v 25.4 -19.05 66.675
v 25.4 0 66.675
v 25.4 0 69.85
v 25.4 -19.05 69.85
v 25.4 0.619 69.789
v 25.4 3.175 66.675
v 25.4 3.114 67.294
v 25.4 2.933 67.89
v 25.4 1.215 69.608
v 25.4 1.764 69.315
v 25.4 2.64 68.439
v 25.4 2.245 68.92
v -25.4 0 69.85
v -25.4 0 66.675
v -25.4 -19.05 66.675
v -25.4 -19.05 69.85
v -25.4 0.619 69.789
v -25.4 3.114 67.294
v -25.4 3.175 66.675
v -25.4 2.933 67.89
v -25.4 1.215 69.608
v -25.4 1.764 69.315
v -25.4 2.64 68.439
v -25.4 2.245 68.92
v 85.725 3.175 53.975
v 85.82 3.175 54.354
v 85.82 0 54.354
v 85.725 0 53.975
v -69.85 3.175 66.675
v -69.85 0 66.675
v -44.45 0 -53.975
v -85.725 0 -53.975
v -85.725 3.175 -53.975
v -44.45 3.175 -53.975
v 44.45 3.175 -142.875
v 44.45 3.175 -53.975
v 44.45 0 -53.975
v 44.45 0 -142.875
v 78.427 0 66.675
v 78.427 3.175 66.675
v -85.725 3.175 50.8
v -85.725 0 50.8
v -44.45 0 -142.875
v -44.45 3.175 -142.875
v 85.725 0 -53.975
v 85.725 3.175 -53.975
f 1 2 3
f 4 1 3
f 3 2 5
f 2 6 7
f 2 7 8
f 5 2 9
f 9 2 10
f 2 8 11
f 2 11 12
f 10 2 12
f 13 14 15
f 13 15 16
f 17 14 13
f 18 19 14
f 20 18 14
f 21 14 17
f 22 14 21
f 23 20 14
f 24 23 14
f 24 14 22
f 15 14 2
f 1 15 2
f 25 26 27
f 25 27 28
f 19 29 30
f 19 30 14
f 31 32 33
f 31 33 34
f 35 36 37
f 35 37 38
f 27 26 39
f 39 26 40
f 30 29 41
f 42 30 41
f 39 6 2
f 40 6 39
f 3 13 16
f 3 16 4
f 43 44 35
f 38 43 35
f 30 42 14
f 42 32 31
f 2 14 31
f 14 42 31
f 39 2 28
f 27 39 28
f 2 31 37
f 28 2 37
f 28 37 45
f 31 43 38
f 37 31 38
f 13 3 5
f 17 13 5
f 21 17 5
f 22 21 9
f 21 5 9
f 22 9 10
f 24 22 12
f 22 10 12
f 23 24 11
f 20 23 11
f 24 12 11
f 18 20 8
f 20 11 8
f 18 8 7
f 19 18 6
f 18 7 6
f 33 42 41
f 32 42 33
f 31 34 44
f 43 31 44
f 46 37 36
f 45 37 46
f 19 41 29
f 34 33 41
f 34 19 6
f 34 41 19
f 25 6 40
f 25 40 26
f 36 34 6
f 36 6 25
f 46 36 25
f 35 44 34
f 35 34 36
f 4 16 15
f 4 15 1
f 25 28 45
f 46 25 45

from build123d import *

# Parameters (mm, degrees)
SKETCH1_W           = 171.45
SKETCH1_H           = 107.95
BOSS_EXTRUDE1_DEPTH = 3.175
BOSS_EXTRUDE2_DEPTH = 3.175
SKETCH4_W           = 50.8
SKETCH4_H           = 3.175
BOSS_EXTRUDE3_DEPTH = 19.05
CHAMFER1_SIZE       = 12.7
CHAMFER1_SIZE_2     = 10.472688289
CHAMFER1_SIZE_3     = 17.454480482
SKETCH6_W           = 88.9
SKETCH6_H           = 88.9
BOSS_EXTRUDE4_DEPTH = 3.175
BOSS_EXTRUDE7_DEPTH = 50.8


with BuildPart() as part:
    # Sketch1 → Boss-Extrude1 (new body)
    with BuildSketch(Plane(origin=(0, 0, 0), x_dir=(1, 0, 0), z_dir=(0, 1, 0))):
        Rectangle(SKETCH1_W, SKETCH1_H)
    extrude(amount=BOSS_EXTRUDE1_DEPTH)

    # Sketch2 → Boss-Extrude2 (add)
    with BuildSketch(Plane(origin=(0, 3.175, 0), x_dir=(1, 0, 0), z_dir=(0, 1, 0))):
        Polygon((-85.725, -53.975), (-82.55, -66.675), (88.9, -66.675), (85.725, -53.975), align=None)
    extrude(amount=-BOSS_EXTRUDE2_DEPTH)

    # Chamfer1
    # the kernel refuses this chamfer: 17.454480482, 12.7, 10.472688289 mm, written as the material it takes off along each edge
    with BuildSketch(Plane(origin=(88.9, 35.835373947, 66.675), x_dir=(-0.21576900793941634, 0, -0.9764444352920651), z_dir=(0, -1, 0))) as chamfer1_piece_1:
        Polygon((CHAMFER1_SIZE * 0.999621916911, -CHAMFER1_SIZE * 0.0274958766106), (CHAMFER1_SIZE_2 * 0.215769007941, -CHAMFER1_SIZE_2 * 0.976444435298), (0, 0), align=None)
    extrude(amount=68.495747894, mode=Mode.SUBTRACT)
    with BuildSketch(Plane(origin=(-82.55, 48.316843842, 66.675), x_dir=(0.9993006642791182, 0, 0.0373922768939412), z_dir=(0, -1, 0))) as chamfer1_piece_2:
        Polygon((CHAMFER1_SIZE * 0.999300664279, -CHAMFER1_SIZE * 0.0373922768939), (-CHAMFER1_SIZE_3 * 0.278641848199, -CHAMFER1_SIZE_3 * 0.960395085581), (0, 0), align=None)
    extrude(amount=93.458687684, mode=Mode.SUBTRACT)

    # Sketch6 → Boss-Extrude4 (add)
    with BuildSketch(Plane(origin=(0, 3.175, 0), x_dir=(1, 0, 0), z_dir=(0, 1, 0))):
        with Locations((0, 98.425)):
            Rectangle(SKETCH6_W, SKETCH6_H)
    extrude(amount=-BOSS_EXTRUDE4_DEPTH)



with BuildPart() as body_2:
    # Sketch4 → Boss-Extrude3 (new body)
    with BuildSketch(Plane.XZ):
        with Locations((0, 68.2625)):
            Rectangle(SKETCH4_W, SKETCH4_H)
    extrude(amount=BOSS_EXTRUDE3_DEPTH)


with BuildPart() as part_1:
    add(part.part)

    add(body_2.part)  # Boss-Extrude7 merges body 2
    # Sketch10 → Boss-Extrude7 (add)
    with BuildSketch(Plane(origin=(25.4, 0, 0), x_dir=(0, 0, -1), z_dir=(1, 0, 0))):
        with BuildLine():
            Line((-66.675, 3.175), (-66.675, 0))
            Line((-66.675, 0), (-69.85, 0))
            ThreePointArc((-69.85, 0), (-68.92006403, 2.24506403), (-66.675, 3.175))
        make_face()
    extrude(amount=-BOSS_EXTRUDE7_DEPTH)


solid = part_1.part
